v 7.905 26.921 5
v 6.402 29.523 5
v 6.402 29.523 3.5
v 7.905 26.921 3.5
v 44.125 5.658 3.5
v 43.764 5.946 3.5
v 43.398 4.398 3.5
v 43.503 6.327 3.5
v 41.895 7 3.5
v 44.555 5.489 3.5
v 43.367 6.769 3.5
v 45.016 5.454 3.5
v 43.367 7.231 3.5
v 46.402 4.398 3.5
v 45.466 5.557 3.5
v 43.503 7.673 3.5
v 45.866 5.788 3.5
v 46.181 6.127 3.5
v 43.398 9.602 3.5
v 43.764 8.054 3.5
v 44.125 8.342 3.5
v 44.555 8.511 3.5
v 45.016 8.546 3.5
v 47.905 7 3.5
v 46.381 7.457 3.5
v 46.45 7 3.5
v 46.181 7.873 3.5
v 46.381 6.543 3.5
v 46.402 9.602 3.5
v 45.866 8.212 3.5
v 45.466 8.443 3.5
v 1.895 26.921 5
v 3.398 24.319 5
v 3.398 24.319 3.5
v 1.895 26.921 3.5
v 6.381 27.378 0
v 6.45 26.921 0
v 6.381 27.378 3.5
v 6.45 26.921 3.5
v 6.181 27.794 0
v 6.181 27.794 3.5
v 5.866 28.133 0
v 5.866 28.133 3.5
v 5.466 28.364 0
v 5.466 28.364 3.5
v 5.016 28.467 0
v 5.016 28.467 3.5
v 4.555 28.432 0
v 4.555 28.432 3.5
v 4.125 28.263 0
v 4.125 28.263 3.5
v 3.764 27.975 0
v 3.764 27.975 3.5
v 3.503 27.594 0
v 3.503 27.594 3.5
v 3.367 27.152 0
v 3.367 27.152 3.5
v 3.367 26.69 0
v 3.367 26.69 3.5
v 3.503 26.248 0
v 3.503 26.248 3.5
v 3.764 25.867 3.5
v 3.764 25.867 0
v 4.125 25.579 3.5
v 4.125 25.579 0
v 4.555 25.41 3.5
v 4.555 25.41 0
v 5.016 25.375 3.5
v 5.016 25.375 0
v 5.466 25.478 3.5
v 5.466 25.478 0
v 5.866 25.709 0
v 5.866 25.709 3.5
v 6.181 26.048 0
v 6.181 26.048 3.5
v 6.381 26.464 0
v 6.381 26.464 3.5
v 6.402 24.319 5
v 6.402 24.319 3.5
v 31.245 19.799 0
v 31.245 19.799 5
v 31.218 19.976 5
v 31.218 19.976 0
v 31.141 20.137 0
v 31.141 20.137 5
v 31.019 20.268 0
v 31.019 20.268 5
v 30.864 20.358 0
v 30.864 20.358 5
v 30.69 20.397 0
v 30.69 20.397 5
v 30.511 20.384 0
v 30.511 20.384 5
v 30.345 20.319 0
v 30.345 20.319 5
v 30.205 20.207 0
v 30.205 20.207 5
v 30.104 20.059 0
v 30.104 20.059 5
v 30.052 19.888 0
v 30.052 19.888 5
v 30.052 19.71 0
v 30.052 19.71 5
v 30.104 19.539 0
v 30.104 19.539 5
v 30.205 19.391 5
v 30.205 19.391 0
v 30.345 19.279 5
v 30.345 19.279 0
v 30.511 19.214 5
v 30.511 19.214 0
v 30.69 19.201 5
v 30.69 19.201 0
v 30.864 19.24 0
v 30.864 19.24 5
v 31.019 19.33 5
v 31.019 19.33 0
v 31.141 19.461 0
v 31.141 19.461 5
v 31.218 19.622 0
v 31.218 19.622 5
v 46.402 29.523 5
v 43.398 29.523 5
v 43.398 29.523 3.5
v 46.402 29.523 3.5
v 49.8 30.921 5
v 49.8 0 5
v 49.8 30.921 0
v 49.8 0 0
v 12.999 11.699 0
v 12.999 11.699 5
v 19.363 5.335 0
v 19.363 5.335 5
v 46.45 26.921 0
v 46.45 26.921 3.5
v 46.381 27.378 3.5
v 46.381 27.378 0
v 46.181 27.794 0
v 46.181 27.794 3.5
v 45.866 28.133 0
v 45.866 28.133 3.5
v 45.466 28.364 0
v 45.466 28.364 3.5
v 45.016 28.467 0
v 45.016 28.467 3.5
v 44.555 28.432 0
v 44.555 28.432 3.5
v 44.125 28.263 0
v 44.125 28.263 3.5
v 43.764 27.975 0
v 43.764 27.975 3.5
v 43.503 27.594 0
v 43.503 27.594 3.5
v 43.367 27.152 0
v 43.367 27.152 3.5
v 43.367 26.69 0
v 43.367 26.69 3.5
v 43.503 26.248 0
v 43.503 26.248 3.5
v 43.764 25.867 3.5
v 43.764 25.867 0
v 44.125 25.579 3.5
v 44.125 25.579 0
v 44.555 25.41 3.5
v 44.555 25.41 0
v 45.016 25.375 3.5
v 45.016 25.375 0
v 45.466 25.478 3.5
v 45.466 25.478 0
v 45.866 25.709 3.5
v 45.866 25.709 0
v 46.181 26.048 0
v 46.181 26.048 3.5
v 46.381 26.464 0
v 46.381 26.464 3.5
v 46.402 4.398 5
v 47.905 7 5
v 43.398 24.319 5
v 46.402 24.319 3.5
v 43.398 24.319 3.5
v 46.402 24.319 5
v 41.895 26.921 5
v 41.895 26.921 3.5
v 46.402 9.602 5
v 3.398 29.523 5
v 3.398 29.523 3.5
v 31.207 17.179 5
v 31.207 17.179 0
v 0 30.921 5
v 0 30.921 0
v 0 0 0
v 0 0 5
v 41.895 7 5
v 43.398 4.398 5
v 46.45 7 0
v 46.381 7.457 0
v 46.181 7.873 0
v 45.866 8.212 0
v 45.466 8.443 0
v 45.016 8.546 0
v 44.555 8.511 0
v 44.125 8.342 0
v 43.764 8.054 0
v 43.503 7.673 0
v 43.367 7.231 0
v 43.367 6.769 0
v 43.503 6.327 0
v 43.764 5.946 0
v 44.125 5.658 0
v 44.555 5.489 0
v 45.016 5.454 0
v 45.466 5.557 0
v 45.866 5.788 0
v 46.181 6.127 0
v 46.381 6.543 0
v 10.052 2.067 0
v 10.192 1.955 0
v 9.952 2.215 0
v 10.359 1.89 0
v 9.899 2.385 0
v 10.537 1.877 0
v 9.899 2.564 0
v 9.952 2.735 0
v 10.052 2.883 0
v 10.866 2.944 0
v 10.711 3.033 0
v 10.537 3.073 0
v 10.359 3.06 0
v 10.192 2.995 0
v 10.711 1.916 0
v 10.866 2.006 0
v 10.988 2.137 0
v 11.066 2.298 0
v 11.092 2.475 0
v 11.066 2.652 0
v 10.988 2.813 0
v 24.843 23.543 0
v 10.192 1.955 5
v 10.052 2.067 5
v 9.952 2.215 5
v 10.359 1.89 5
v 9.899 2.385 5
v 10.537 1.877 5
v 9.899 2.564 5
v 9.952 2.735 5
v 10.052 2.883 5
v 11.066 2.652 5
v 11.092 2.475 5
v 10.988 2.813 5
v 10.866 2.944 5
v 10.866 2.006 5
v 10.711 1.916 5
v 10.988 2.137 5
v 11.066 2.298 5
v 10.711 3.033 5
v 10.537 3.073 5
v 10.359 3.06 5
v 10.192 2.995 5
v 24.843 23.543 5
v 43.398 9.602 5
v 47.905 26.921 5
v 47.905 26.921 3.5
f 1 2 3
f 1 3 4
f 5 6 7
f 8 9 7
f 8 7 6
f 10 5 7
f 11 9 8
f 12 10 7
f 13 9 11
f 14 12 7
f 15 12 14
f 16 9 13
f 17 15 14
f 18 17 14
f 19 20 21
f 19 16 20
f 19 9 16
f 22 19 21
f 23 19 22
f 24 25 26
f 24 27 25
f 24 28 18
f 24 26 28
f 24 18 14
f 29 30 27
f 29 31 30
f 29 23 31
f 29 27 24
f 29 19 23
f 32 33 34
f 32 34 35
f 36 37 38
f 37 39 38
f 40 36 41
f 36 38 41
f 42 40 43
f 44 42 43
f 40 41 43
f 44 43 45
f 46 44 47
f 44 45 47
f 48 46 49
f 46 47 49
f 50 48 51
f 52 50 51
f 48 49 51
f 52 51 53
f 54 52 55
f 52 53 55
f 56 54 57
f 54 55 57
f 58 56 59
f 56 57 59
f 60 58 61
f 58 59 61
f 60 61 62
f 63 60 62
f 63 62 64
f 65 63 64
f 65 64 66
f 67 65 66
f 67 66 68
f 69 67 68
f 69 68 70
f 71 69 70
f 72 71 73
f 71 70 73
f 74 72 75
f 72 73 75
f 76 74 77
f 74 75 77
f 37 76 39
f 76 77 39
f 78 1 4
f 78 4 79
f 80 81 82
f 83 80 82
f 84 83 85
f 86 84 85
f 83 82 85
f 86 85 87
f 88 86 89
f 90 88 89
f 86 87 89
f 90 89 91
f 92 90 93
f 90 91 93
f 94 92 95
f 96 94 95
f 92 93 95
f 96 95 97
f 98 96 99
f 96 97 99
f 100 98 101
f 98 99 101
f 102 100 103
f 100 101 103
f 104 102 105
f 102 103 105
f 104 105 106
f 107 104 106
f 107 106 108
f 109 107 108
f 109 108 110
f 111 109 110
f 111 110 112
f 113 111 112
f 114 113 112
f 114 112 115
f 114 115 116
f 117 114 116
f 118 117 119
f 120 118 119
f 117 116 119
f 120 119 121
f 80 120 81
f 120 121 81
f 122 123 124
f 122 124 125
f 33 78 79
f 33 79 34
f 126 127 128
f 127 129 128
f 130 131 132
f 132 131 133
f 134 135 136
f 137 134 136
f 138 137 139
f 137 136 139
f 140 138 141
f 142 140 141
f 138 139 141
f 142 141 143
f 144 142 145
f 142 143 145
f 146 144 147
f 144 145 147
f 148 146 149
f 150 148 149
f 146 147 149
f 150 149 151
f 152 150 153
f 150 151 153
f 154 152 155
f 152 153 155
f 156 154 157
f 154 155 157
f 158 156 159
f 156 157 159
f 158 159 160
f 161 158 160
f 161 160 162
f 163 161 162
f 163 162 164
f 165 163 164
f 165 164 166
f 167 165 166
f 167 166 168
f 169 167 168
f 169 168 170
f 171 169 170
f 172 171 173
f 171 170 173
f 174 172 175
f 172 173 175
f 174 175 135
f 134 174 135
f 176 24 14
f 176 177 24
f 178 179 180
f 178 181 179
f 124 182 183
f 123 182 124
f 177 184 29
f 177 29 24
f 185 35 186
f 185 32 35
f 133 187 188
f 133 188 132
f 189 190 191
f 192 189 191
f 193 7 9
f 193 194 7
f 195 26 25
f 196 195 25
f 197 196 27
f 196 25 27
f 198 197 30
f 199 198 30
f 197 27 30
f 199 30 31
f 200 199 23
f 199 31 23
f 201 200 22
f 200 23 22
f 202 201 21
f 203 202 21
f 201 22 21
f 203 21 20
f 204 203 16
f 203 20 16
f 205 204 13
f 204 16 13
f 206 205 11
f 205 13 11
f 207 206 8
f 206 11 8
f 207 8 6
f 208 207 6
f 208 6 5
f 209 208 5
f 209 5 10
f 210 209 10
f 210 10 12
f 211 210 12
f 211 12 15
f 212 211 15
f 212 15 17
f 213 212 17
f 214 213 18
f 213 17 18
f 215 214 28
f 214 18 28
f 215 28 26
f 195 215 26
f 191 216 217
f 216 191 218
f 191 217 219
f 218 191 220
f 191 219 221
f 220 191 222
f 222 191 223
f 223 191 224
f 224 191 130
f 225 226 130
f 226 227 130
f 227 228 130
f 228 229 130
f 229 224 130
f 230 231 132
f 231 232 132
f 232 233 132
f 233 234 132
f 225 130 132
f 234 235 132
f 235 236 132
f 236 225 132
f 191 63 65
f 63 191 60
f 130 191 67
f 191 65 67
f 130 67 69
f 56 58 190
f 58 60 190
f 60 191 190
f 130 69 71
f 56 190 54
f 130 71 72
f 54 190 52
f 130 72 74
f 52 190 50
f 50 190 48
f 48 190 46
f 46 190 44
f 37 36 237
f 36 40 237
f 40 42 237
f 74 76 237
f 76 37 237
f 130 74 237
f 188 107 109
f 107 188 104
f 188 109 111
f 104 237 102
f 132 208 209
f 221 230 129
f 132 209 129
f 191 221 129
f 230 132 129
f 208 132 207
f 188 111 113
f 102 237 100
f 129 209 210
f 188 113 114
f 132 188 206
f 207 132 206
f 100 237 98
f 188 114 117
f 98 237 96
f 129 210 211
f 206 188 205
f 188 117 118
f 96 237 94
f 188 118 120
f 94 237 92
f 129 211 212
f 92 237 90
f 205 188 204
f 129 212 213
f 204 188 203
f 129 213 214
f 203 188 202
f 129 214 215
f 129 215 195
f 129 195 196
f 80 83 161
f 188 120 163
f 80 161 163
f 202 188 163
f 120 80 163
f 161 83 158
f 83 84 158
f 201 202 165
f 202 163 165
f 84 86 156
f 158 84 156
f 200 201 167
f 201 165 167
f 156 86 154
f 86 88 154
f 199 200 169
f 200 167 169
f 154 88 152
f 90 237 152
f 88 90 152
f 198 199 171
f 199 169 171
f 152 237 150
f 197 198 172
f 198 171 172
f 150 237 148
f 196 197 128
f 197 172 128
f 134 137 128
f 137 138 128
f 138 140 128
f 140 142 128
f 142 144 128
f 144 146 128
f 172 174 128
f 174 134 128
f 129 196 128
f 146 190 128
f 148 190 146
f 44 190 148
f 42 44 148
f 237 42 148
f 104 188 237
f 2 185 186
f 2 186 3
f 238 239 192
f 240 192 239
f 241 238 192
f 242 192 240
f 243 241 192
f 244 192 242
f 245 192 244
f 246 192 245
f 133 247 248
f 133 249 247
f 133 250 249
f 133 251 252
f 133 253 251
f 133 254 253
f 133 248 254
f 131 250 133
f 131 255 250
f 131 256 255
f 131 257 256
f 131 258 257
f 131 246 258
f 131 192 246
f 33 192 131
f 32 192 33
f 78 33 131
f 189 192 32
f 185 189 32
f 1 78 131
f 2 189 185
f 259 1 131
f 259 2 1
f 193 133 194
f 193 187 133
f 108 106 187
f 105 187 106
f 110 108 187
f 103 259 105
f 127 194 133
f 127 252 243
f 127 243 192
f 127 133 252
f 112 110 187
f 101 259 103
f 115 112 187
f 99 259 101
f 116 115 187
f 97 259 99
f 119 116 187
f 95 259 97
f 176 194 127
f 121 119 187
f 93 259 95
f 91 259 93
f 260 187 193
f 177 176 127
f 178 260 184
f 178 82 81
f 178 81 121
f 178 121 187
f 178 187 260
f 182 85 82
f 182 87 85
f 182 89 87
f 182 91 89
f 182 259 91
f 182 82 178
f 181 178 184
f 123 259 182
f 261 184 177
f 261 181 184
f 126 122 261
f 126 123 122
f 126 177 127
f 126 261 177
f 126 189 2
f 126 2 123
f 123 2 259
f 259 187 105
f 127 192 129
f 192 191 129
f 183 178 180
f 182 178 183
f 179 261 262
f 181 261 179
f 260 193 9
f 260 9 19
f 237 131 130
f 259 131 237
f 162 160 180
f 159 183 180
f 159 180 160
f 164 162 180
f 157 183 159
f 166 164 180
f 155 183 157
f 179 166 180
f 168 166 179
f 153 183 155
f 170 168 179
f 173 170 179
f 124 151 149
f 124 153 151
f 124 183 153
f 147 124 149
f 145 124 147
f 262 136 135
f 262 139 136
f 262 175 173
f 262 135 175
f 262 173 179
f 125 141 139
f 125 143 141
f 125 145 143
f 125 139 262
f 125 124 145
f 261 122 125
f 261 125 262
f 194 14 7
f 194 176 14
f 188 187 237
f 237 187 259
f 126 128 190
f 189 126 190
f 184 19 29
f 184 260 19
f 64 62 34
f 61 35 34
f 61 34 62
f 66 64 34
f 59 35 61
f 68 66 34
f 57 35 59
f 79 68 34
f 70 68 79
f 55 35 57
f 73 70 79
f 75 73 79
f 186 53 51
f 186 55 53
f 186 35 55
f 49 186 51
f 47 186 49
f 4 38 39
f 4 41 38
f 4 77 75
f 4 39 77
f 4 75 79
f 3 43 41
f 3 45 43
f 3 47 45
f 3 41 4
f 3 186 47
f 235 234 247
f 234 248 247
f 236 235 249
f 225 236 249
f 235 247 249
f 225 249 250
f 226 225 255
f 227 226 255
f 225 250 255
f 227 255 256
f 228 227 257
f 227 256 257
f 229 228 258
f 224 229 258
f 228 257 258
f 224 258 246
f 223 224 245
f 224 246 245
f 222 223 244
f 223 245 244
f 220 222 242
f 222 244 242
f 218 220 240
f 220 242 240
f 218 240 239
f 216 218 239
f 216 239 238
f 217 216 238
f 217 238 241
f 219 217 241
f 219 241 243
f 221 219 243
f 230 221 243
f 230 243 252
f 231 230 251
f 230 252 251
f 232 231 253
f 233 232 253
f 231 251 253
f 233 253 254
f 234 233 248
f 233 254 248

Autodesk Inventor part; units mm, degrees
ref_plane "YZ Plane" through (0, 0, 0) normal (1, 0, 0) x (0, 1, 0)
ref_plane "XZ Plane" through (0, 0, 0) normal (0, 1, 0) x (-1, 0, 0)
ref_plane "XY Plane" through (0, 0, 0) normal (0, 0, 1) x (1, 0, 0)
sketch "Sketch1" plane through (0, 0, 0) normal (0, 0, 1) x (1, 0, 0)
  line L0 (0, 0) -> (49.8, 0)
  line L1 (49.8, 0) -> (49.8, 30.921)
  line L2 (49.8, 30.921) -> (0, 30.921)
  line L3 (0, 30.921) -> (0, 0)
  dimension "d0" = 49.8
  dimension "d1" = 30.921
extrude "Extrusion1" add sketch "Sketch1" along normal blind 5
sketch "Sketch3" plane through (0, 0, 5) normal (0, 0, 1) x (1, 0, 0)
  line L0 (0, 0) -> (49.8, 0) projected
  line L1 (24.9, 0) -> (41.821, 0) construction
  line L2 (49.8, 0) -> (49.8, 30.921) projected
  line L3 (22.9, 16.921) -> (26.9, 16.921)
  line L4 (24.9, 14.921) -> (24.9, 18.921)
  circle A0 centre (24.9, 16.921) radius 2
  dimension "d22" = 4
  dimension "d23" = 4
  dimension "d24" = 4
  dimension "d25" = 16.921
  dimension "d26" = 24.9
sketch "Sketch4" plane through (0, 0, 5) normal (0, 0, 1) x (1, 0, 0)
  line L0 (0, 0) -> (49.8, 0) projected
  line L1 (0, 0) -> (7.1085, 7.1085)
  line L2 (0, 0) -> (10.053, 0) construction
  line L3 (17.8214, 5.3223) -> (45.7841, 5.3223) construction
  line L4 (22.1418, 11.0415) -> (25.8541, 14.7538)
  line L5 (25.8541, 14.7538) -> (23.7328, 16.8751)
  line L6 (23.7328, 16.8751) -> (20.0205, 13.1628)
  line L7 (20.0205, 13.1628) -> (22.1418, 11.0415)
  line L8 (16.6871, 14.6491) -> (21.9371, 14.6491) construction
  line L9 (20.0205, 13.1628) -> (25.8541, 14.7538)
  line L10 (23.7328, 16.8751) -> (22.1418, 11.0415)
  line L11 (22.9373, 13.9583) -> (23.9979, 12.8976)
  line L12 (22.9, 16.921) -> (26.9, 16.921) projected
  line L13 (24.9, 14.921) -> (24.9, 18.921) projected
  circle A0 centre (24.9, 16.921) radius 2 projected
  line L14 (22.8984, 10.2849) -> (26.6107, 13.9972)
  line L15 (6.9567, 4.2426) -> (27.8163, 25.1023)
  line L16 (32.6954, 20.2233) -> (64.1581, 20.2233) construction
  circle A1 centre (30.6448, 19.799) radius 0.75
  circle A2 centre (10.4922, 2.4749) radius 0.75
  line L17 (31.2069, 17.1792) -> (24.8429, 23.5431)
  line L18 (12.9989, 11.6991) -> (19.3629, 5.3351)
  line L19 (26.6107, 13.9972) -> (32.7661, 20.1525)
  line L20 (20.6107, 13.9972) -> (29.3157, 13.9972) construction
  line L21 (32.7661, 20.1525) -> (11.9064, -0.7071)
  line L22 (11.9064, -0.7071) -> (6.9567, 4.2426)
  line L23 (27.8163, 25.1023) -> (32.7661, 20.1525)
  line L24 (29.0217, 22.4081) -> (58.5217, 22.4081) construction
  line L25 (12.9989, 11.6991) -> (24.8429, 23.5431)
  line L26 (31.2069, 17.1792) -> (19.3629, 5.3351)
  line L27 (14.162, 1.5485) -> (11.9064, -0.7071)
  line L28 (10.9064, -0.7071) -> (14.0963, -0.7071) construction
  line L29 (10.8458, 2.8284) -> (10.4922, 2.4749)
  line L30 (10.8458, 2.8284) -> (11.3458, 2.8284) construction
  line L31 (10.9064, -0.7071) -> (11.9064, -0.7071)
  circle A3 centre (30.6448, 19.799) radius 0.6
  circle A4 centre (10.4922, 2.4749) radius 0.6
  point P0 (25.55, 22.836)
  point P1 (13.706, 10.992)
  dimension "d27" = 10.053
  dimension "d28" = 45
  dimension "d32" = 5.25
  dimension "d33" = 45
  dimension "d34" = 3
  dimension "d36" = 1.07
  dimension "d40" = 1.5
  dimension "d43" = 1.5
  dimension "d46" = 5.5
  dimension "d47" = 6
  dimension "d51" = 8.705
  dimension "d52" = 45
  dimension "d53" = 29.5
  dimension "d54" = 135
  dimension "d55" = 7
  dimension "d56" = 3.75
  dimension "d57" = 1
  dimension "d58" = 1
  dimension "d59" = 2.93
  dimension "d60" = 1.25
  dimension "d61" = 1.75
  dimension "d97" = 135
  dimension "d98" = 0.5
  dimension "d99" = 135
  dimension "d101" = 1
  dimension "d102" = 1.2
  dimension "d103" = 1.2
extrude "Extrusion3" cut sketch "Sketch4" against normal blind 5 contours L18 L25 L17 L15 | L15 L17 L19 L14 L21 L18 | L21 L14 L19 L17 L26 L18 | L10 L11 L4 | L7 L9 L10 | L11 L9 L4 | L6 A0 L10 L9 | L10 A0 L5 L9 | A0 L12 L13 L5 L6 | L6 L10 A0 | L10 L5 L13 A0 | A0 L13 L5 | L5 L13 L12 A0 | A0 L13 L12 | L12 L13 A0 | A3 | A4
sketch "Sketch5" plane through (0, 0, 5) normal (0, 0, 1) x (1, 0, 0)
  circle A0 centre (4.9, 26.921) radius 1.55
  circle A1 centre (44.9, 7) radius 1.55
  circle A2 centre (44.9, 26.921) radius 1.55
  line L0 (0, 30.921) -> (0, 0) projected
  line L1 (49.8, 30.921) -> (0, 30.921) projected
  line L2 (49.8, 0) -> (49.8, 30.921) projected
  line L3 (0, 0) -> (49.8, 0) projected
  dimension "d62" = 3.1
  dimension "d63" = 3.1
  dimension "d64" = 3.1
  dimension "d65" = 4.9
  dimension "d66" = 4
  dimension "d67" = 4.9
  dimension "d68" = 4
  dimension "d69" = 4.9
  dimension "d70" = 7
extrude "Extrusion4" cut sketch "Sketch5" against normal blind 5 contours A0 | A1 | A2
sketch "Sketch6" plane through (0, 0, 5) normal (0, 0, 1) x (1, 0, 0)
  circle A0 centre (4.9, 26.921) radius 1.55 projected
  line L0 (2.15, 29.671) -> (7.65, 24.171) construction
  line L1 (7.65, 29.671) -> (2.15, 24.171) construction
  line L2 (3.3975, 24.3186) -> (1.895, 26.921)
  line L3 (1.895, 26.921) -> (3.3975, 29.5234)
  line L4 (3.3975, 29.5234) -> (6.4025, 29.5234)
  line L5 (6.4025, 29.5234) -> (7.905, 26.921)
  line L6 (7.905, 26.921) -> (6.4025, 24.3186)
  line L7 (6.4025, 24.3186) -> (3.3975, 24.3186)
  line L8 (43.3975, 29.5234) -> (46.4025, 29.5234)
  line L9 (41.895, 26.921) -> (43.3975, 29.5234)
  line L10 (43.3975, 24.3186) -> (41.895, 26.921)
  line L11 (46.4025, 24.3186) -> (43.3975, 24.3186)
  line L12 (47.905, 26.921) -> (46.4025, 24.3186)
  line L13 (46.4025, 29.5234) -> (47.905, 26.921)
  line L14 (44.9, 26.921) -> (44.9, 16.921)
  line L15 (43.3975, 4.3976) -> (41.895, 7)
  line L16 (41.895, 7) -> (43.3975, 9.6024)
  line L17 (43.3975, 9.6024) -> (46.4025, 9.6024)
  line L18 (46.4025, 9.6024) -> (47.905, 7)
  line L19 (47.905, 7) -> (46.4025, 4.3976)
  line L20 (46.4025, 4.3976) -> (43.3975, 4.3976)
  point P0 (0, 0)
  point P1 (44.9, 7)
  dimension "d73" = 5.5
  dimension "d74" = 5.5
  dimension "d81" = 6.01
  dimension "d84" = 40
  dimension "d89" = 10
  dimension "d92" = 19.921
extrude "Extrusion5" cut sketch "Sketch6" against normal blind 1.5
properties part number "30_CUBE_penSIM_DMD_Holder"
